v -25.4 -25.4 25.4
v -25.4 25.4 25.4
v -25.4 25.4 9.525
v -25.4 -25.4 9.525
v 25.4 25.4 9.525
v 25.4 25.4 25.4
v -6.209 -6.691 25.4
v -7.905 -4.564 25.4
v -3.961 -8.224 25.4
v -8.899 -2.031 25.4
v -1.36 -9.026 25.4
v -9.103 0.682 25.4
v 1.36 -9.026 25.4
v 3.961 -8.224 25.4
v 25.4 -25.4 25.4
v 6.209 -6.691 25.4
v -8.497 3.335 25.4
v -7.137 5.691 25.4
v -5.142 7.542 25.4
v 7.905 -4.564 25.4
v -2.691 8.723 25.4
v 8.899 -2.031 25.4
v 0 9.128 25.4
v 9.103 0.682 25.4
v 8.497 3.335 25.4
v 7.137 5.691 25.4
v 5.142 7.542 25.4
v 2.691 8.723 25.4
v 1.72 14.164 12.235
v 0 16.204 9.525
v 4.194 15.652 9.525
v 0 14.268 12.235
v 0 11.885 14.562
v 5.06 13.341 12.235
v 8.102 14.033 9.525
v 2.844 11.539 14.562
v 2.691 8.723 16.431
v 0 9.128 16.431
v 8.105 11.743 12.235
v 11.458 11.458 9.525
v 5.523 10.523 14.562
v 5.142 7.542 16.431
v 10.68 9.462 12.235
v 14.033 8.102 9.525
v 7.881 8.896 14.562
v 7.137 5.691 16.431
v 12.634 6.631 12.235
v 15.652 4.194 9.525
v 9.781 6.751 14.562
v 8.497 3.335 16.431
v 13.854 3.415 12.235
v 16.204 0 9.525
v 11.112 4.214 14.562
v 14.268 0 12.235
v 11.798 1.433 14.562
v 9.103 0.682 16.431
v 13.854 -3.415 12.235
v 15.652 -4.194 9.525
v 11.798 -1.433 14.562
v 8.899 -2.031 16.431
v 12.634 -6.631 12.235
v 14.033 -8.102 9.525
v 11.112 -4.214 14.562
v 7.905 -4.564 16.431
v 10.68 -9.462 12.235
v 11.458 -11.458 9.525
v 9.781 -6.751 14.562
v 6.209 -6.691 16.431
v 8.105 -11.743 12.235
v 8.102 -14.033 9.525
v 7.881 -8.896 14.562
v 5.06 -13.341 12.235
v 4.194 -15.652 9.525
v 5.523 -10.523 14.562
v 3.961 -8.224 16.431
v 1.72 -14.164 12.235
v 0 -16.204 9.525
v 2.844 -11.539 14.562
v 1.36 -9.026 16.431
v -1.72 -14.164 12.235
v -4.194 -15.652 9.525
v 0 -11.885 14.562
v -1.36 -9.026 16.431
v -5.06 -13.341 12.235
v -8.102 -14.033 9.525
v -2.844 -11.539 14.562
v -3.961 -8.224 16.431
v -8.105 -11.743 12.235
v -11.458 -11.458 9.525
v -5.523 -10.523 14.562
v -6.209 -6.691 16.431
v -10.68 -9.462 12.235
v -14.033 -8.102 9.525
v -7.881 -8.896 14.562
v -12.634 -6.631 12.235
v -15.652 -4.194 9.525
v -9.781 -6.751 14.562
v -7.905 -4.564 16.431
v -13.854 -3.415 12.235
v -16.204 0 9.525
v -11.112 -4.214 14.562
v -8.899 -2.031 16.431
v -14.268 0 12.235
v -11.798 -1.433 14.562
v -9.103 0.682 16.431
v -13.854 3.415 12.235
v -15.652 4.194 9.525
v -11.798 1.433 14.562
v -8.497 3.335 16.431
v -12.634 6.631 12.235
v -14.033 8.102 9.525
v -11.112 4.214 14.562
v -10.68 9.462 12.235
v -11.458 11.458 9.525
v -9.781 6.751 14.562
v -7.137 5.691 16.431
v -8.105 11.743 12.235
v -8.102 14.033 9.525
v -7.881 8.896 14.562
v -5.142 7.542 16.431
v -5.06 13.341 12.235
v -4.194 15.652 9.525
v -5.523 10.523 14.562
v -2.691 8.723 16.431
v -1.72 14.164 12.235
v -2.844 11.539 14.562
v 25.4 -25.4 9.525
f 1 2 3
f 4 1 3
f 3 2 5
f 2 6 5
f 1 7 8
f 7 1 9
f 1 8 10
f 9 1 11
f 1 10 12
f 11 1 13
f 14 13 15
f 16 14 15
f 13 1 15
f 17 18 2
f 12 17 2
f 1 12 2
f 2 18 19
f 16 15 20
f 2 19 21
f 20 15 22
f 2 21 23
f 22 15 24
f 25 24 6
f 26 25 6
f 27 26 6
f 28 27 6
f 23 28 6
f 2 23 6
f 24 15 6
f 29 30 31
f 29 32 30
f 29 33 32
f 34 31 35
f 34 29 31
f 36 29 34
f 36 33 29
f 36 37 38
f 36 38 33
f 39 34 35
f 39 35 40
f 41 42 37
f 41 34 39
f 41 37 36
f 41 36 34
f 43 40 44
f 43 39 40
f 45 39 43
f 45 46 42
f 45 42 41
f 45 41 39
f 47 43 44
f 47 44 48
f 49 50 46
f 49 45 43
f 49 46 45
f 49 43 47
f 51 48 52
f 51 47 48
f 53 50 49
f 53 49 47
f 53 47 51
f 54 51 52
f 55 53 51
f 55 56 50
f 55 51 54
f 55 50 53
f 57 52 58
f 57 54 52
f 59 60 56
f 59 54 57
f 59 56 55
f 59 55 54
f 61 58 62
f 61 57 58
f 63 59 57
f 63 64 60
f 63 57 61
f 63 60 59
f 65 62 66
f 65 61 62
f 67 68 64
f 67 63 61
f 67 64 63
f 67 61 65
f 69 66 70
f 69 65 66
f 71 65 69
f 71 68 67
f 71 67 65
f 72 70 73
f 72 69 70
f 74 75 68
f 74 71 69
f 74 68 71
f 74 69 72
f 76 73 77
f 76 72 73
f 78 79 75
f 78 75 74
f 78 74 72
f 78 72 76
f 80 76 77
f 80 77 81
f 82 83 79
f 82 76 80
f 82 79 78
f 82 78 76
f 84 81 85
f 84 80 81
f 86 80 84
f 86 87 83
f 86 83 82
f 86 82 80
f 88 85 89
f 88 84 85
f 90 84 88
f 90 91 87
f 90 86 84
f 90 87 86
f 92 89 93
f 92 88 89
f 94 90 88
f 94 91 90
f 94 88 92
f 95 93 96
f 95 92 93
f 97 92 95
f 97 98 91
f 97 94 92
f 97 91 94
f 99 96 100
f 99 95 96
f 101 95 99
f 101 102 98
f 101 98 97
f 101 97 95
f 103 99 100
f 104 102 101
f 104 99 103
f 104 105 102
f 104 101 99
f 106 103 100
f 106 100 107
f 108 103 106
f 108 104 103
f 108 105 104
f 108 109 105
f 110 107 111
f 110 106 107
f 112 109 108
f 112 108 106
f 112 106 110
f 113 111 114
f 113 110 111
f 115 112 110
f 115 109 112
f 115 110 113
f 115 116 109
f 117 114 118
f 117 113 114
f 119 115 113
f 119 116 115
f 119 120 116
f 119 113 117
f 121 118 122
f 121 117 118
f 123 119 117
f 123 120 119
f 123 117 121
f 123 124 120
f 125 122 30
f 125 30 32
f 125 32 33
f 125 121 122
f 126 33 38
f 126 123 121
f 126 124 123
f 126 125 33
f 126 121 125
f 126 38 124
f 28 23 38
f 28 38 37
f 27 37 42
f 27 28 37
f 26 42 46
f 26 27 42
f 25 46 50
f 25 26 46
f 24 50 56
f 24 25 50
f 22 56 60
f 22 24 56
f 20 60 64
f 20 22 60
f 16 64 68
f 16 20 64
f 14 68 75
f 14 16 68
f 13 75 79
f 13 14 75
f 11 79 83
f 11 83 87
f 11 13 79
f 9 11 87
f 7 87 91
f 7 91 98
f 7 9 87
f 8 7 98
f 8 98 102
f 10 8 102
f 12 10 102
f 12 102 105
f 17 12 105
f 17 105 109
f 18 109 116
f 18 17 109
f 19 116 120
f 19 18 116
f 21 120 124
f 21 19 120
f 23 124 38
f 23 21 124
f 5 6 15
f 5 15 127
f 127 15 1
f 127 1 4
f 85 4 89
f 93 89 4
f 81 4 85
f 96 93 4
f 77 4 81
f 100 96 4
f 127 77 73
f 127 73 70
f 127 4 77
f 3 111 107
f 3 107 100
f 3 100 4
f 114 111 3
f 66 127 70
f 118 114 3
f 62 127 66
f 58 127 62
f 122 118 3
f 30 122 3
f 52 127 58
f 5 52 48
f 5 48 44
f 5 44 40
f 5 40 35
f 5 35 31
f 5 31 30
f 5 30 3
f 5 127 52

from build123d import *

# Parameters (mm, degrees)
SKETCH3_W      = 15.875
SKETCH3_H      = 50.8
EXTRUDE2_DEPTH = 25.4


with BuildPart() as part:
    # Sketch3 → Extrude2 (new, symmetric)
    with BuildSketch(Plane(origin=(0, 0, 0), x_dir=(0, 0, -1), z_dir=(1, 0, 0))):
        with Locations((-17.4625, 0)):
            Rectangle(SKETCH3_W, SKETCH3_H)
    extrude(amount=EXTRUDE2_DEPTH, both=True)

    # Sketch4 → Cut-Revolve2 (revolve, cut)
    with BuildSketch(Plane(origin=(0, 0, 0), x_dir=(0, 0, -1), z_dir=(1, 0, 0))):
        with BuildLine():
            Line((-34.061608779, 0), (0, 0))
            Line((0, 0), (0, 18.796))
            ThreePointArc((0, 18.796), (-9.531982441, 16.199719959), (-16.430671014, 9.128125))
            Line((-16.430671014, 9.128125), (-34.061608779, 9.128125))
            Line((-34.061608779, 9.128125), (-34.061608779, 0))
        make_face()
    revolve(axis=Axis((0, 0, 0), (0, 0, -1)), mode=Mode.SUBTRACT)


solid = part.part
